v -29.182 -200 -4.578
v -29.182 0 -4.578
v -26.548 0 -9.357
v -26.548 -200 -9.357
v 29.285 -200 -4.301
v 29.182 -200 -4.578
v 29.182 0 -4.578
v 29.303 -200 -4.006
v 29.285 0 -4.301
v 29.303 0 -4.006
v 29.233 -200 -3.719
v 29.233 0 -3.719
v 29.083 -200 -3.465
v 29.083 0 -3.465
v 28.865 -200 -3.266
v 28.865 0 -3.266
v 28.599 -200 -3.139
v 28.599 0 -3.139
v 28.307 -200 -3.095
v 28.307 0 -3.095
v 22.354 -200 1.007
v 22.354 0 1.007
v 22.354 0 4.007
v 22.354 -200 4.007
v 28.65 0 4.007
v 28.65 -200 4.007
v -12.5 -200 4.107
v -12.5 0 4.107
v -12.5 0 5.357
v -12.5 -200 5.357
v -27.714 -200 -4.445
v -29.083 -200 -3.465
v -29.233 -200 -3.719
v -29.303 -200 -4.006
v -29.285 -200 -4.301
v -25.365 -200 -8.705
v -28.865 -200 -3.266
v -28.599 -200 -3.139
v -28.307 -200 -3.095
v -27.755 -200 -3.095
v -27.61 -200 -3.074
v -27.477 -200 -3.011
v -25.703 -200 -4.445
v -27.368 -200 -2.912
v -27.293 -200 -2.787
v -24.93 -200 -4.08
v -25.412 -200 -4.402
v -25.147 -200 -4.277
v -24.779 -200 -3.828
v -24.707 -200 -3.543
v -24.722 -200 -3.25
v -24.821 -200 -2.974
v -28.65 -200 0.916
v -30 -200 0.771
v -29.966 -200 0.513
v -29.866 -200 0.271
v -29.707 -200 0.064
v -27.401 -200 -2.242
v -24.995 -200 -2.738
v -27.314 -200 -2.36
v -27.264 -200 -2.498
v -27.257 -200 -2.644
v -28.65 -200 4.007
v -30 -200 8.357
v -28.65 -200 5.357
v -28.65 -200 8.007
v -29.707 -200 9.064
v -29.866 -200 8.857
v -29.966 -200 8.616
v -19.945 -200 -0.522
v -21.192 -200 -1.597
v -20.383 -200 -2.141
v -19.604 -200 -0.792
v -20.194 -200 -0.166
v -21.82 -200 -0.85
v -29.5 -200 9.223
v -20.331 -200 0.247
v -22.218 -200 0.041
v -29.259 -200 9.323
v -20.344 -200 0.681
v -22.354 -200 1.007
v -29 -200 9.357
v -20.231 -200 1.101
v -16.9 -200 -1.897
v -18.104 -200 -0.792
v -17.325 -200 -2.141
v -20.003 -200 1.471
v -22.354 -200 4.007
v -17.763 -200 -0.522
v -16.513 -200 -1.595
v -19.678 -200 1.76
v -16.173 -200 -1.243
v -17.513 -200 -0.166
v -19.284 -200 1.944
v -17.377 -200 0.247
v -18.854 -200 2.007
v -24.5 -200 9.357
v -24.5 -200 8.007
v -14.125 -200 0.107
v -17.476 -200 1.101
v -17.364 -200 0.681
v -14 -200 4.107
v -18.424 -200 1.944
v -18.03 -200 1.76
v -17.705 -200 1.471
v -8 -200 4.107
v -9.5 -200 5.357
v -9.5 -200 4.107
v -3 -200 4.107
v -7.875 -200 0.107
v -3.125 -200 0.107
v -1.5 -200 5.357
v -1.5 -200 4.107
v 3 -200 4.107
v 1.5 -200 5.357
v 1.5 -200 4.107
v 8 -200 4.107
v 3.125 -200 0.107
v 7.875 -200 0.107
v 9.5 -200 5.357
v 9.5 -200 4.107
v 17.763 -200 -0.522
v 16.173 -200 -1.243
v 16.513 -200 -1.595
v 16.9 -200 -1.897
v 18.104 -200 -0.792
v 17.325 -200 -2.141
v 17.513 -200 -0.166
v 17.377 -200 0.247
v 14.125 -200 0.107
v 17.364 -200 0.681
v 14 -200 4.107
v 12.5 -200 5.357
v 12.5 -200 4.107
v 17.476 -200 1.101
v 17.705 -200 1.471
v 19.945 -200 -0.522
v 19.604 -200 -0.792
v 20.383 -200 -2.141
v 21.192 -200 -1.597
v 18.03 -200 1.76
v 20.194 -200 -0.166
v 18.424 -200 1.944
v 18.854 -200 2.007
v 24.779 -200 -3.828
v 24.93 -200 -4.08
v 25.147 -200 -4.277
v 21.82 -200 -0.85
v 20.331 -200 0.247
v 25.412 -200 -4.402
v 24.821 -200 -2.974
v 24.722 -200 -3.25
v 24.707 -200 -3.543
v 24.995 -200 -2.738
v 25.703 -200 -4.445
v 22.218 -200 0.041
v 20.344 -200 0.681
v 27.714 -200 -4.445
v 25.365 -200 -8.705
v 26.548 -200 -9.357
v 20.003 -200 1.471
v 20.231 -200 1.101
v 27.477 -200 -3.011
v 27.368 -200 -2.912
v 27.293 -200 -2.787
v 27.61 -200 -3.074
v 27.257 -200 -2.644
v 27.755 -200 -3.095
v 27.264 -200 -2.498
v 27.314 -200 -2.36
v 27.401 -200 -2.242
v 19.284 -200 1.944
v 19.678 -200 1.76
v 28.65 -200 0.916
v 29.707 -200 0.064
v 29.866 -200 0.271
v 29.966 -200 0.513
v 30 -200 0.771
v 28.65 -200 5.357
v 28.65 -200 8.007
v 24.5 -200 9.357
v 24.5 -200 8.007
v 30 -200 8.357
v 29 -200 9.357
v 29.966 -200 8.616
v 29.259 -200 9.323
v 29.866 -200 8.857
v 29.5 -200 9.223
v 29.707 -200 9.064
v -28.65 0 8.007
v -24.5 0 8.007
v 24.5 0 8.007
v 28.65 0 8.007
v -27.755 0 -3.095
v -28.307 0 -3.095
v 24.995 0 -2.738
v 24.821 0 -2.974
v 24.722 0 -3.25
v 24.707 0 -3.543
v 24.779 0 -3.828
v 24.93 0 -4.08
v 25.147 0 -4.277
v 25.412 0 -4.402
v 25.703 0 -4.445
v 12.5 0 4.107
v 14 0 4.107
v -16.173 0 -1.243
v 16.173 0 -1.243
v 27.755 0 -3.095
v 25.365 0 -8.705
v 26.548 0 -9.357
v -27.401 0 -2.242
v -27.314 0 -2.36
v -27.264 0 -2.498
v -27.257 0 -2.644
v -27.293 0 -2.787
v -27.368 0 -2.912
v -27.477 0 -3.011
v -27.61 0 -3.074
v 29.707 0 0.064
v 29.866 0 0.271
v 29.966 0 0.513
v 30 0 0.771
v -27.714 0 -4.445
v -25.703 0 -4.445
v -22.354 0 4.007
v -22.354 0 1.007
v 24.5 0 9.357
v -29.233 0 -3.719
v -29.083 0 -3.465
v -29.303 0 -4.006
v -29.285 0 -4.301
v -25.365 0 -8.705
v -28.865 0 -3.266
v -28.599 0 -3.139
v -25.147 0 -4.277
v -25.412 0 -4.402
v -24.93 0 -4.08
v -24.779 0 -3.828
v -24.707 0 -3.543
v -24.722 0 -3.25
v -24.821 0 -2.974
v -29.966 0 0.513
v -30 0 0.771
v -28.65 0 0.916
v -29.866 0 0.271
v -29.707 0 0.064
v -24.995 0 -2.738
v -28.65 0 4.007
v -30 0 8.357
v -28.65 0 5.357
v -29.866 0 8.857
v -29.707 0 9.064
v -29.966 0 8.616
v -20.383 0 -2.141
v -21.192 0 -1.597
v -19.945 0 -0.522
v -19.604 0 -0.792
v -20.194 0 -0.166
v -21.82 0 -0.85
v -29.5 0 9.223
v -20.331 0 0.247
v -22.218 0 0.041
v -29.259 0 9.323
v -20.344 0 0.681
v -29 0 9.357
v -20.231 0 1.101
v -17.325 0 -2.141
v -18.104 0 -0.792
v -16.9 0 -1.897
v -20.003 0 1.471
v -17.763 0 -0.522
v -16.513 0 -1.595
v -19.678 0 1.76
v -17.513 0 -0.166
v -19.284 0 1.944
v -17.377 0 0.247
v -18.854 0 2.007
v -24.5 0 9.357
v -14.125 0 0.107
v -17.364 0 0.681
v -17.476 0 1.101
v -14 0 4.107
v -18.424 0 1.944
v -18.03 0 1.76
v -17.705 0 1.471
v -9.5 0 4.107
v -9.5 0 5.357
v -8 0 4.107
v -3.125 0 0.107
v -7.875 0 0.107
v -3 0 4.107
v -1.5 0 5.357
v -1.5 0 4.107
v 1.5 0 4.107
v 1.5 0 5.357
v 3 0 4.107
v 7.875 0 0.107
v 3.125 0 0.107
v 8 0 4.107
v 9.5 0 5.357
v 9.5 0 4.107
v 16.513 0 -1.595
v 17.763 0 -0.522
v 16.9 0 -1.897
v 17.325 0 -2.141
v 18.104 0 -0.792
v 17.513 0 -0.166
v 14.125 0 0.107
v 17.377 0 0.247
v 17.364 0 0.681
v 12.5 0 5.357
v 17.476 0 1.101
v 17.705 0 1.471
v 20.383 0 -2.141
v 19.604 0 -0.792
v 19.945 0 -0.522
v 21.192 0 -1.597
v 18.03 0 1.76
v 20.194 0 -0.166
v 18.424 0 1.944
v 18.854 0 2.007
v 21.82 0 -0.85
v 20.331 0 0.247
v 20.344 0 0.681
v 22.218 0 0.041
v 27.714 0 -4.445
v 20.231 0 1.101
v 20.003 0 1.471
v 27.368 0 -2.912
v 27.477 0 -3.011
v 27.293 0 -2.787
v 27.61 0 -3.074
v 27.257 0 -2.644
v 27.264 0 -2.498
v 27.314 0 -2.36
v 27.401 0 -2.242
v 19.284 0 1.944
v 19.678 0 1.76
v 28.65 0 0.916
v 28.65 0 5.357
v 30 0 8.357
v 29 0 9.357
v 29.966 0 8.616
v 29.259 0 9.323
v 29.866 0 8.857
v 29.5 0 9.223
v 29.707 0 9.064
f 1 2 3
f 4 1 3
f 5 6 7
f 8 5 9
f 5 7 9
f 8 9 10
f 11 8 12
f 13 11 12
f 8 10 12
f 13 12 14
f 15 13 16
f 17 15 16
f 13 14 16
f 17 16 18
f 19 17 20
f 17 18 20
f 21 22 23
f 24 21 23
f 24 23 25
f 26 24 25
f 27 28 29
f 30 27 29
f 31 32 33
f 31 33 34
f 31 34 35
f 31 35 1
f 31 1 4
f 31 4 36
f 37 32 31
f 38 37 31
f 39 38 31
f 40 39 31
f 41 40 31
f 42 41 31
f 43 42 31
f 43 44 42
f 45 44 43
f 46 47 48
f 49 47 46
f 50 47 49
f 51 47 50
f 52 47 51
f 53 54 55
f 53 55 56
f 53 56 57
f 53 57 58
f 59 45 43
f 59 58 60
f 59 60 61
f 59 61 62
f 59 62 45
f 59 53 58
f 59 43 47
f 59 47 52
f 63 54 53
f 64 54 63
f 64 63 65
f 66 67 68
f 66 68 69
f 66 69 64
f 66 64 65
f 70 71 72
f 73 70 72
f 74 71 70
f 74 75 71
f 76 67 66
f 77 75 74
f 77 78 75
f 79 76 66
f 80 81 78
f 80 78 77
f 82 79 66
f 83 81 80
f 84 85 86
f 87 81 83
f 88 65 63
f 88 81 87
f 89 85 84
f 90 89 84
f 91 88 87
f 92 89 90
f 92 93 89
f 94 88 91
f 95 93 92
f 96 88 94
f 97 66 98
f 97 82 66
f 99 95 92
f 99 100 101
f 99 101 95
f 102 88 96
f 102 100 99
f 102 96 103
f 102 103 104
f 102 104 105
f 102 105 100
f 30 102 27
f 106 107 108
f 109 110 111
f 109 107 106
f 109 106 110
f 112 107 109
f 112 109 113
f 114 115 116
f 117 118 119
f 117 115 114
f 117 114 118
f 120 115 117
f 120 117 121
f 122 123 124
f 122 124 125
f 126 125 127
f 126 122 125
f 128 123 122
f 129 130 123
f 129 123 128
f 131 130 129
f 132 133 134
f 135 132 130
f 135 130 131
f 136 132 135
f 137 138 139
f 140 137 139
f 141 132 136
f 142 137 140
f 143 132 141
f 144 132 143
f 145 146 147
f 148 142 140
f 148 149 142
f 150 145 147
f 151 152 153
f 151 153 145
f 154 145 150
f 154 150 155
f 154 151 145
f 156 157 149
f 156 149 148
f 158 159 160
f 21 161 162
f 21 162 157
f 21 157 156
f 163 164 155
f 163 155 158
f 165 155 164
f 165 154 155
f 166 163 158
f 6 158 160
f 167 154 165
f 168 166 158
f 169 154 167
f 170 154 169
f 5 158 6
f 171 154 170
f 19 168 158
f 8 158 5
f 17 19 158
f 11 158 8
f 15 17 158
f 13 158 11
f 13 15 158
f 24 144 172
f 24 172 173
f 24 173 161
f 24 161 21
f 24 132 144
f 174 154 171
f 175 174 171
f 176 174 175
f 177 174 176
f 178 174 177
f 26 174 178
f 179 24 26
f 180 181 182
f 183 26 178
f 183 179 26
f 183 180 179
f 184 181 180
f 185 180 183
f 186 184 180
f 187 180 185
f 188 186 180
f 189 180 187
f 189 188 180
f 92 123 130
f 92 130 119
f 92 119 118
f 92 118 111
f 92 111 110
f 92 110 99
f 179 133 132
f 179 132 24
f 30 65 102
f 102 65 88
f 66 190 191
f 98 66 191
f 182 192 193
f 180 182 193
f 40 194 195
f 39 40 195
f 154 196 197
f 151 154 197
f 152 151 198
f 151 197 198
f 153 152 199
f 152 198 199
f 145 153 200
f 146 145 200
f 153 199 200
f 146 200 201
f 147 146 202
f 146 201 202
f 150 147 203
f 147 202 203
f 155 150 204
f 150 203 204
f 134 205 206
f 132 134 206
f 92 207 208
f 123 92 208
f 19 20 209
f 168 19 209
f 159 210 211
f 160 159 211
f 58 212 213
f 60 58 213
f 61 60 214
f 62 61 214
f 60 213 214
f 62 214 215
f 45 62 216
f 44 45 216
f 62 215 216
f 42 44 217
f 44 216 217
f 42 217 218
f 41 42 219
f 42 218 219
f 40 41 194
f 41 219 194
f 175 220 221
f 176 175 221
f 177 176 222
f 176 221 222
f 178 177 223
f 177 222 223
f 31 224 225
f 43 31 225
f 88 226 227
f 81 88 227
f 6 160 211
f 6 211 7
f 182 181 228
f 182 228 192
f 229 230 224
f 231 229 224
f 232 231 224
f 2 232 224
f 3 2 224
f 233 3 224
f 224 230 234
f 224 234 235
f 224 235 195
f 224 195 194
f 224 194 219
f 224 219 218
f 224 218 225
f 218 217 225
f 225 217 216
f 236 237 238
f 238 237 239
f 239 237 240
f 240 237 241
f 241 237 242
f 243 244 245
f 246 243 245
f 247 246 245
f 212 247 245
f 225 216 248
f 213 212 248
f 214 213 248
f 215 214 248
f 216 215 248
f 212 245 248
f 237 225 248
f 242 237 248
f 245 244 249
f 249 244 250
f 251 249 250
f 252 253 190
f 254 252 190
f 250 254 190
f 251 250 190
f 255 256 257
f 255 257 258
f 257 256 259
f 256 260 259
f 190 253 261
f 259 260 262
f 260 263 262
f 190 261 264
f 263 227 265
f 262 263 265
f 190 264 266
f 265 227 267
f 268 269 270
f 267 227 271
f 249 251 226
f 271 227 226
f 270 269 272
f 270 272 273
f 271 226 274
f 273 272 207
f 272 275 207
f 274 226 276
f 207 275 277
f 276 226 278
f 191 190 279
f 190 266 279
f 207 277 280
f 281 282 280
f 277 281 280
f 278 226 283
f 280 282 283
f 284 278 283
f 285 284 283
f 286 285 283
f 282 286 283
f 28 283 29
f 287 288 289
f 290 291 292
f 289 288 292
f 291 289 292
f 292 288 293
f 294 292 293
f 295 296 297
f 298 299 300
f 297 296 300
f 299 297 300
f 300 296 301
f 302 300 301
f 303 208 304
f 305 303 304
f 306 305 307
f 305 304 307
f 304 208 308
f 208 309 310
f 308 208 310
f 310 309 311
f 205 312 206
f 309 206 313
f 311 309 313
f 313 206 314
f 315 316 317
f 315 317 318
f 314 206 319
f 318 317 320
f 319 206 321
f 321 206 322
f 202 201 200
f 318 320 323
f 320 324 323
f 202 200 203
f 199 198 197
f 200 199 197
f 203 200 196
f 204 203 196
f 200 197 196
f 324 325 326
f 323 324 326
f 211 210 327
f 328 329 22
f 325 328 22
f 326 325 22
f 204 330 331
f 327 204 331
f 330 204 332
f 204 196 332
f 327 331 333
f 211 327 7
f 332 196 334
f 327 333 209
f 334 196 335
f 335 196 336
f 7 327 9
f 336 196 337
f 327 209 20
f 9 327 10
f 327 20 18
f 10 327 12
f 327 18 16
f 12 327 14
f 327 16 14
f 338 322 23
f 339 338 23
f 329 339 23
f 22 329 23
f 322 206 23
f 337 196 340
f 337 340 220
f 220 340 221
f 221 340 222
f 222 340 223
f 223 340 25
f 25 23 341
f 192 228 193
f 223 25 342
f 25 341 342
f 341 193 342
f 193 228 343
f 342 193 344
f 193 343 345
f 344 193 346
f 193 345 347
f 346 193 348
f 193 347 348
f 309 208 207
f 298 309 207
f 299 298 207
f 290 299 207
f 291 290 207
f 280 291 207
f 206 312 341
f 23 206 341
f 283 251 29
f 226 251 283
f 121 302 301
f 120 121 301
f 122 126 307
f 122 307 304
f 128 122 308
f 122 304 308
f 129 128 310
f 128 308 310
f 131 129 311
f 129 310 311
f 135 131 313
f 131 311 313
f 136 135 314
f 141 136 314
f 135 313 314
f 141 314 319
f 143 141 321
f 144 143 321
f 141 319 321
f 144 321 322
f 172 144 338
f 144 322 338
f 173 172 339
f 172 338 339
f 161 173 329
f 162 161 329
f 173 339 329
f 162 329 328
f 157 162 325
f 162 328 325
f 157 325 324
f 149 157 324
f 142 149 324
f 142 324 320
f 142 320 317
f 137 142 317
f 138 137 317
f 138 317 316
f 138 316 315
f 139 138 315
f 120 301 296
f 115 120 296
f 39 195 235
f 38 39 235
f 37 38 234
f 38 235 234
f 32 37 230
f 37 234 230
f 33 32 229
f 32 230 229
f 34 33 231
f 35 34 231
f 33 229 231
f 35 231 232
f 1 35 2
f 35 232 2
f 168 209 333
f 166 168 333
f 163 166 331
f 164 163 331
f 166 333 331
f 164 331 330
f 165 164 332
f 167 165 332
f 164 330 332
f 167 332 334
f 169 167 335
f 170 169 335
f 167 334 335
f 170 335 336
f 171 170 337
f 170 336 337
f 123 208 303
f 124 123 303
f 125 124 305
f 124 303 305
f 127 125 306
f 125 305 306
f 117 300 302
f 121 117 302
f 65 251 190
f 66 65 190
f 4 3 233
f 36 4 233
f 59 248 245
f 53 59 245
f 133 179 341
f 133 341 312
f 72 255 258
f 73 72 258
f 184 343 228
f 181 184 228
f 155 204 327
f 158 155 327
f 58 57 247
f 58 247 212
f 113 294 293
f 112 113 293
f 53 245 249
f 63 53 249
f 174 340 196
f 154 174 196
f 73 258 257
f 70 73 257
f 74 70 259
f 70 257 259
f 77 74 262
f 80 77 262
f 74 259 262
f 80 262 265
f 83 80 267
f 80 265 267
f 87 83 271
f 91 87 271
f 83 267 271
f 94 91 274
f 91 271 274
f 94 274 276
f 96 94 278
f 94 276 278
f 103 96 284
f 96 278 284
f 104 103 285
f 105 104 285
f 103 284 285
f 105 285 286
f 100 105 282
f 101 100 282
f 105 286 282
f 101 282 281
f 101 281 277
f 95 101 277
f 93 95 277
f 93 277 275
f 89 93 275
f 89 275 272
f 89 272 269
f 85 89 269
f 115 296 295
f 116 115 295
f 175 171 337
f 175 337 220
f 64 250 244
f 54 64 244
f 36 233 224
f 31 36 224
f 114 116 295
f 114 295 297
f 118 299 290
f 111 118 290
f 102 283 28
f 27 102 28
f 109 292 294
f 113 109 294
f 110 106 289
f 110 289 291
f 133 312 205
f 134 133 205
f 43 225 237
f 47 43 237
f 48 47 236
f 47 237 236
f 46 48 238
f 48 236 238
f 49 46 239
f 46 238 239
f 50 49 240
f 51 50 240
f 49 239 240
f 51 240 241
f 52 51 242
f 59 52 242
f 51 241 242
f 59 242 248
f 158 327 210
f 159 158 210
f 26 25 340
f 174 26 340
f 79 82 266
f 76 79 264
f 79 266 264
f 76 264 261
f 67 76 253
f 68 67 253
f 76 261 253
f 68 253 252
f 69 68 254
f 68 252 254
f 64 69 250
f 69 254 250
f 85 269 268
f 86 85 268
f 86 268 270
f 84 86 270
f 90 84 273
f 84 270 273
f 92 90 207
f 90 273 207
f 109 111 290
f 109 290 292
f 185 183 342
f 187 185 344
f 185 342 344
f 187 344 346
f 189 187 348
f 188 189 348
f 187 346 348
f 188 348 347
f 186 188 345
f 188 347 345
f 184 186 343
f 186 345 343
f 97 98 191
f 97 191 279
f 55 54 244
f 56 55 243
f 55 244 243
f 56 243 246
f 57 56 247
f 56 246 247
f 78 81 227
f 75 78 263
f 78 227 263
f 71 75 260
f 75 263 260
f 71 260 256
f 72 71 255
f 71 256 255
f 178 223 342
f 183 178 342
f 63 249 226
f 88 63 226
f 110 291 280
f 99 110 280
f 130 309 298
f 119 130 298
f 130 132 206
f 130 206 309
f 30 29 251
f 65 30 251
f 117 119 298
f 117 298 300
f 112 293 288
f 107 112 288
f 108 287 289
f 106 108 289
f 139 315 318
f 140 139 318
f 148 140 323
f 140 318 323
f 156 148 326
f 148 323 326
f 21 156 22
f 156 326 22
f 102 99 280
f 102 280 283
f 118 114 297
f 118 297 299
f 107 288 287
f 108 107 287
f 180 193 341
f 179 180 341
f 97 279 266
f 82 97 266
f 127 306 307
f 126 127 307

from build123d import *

# Parameters (mm, degrees)
F1_DEPTH = 200


# Not quite as in the source:
# - ends of sketch curves that miss each other by under 0.0002 mm in the source are joined


with BuildPart() as f1:
    # F0 (on Front) → F1 (new body)
    with BuildSketch(Plane.XZ):
        with BuildLine():
            Line((-18.103784, -0.791851), (-17.32476, -2.14116))
            ThreePointArc((-17.32476, -2.14116), (-16.7014064944, -1.7527534112), (-16.1728328101, -1.2428131594))
            Line((-16.1728328101, -1.2428131594), (16.172833, -1.242813))
            ThreePointArc((16.172833, -1.242813), (16.7014064944, -1.7527534112), (17.3247602013, -2.1411595856))
            Line((17.3247602013, -2.1411595856), (18.103784, -0.791851))
            ThreePointArc((18.103784, -0.791851), (18.853784, 2.007187), (19.6037840458, -0.7918510793))
            Line((19.6037840458, -0.7918510793), (20.382808, -2.14116))
            ThreePointArc((20.382808, -2.14116), (21.820396824, -0.8500174455), (22.353784, 1.007187))
            Line((22.353784, 1.007187), (22.353784, 4.007187))
            Line((22.353784, 4.007187), (28.65, 4.007187))
            Line((28.65, 4.007187), (28.65, 0.916375))
            Line((28.65, 0.916375), (24.995488, -2.738136))
            ThreePointArc((24.995488, -2.738136), (24.7787154675, -3.8279264324), (25.702595, -4.445243))
            Line((25.702595, -4.445243), (27.714112, -4.445243))
            Line((27.714112, -4.445243), (25.365346, -8.705386))
            Line((25.365346, -8.705386), (26.54757, -9.357187))
            Line((26.54757, -9.357187), (29.182471, -4.578059))
            ThreePointArc((29.182471, -4.578059), (29.1678006221, -3.5867237514), (28.30675, -3.095243))
            Line((28.30675, -3.095243), (27.754677, -3.095243))
            ThreePointArc((27.754677, -3.095243), (27.292737369, -2.7865850428), (27.4011231094, -2.2416901094))
            Line((27.4011231094, -2.2416901094), (29.707107, 0.064294))
            ThreePointArc((29.707107, 0.064294), (29.9238795325, 0.3887175676), (30, 0.771401))
            Line((30, 0.771401), (30, 8.357187))
            ThreePointArc((30, 8.357187), (29.7071067812, 9.0642937812), (29, 9.357187))
            Line((29, 9.357187), (24.5, 9.357187))
            Line((24.5, 9.357187), (24.5, 8.007187))
            Line((24.5, 8.007187), (28.65, 8.007187))
            Line((28.65, 8.007187), (28.65, 5.357187))
            Line((28.65, 5.357187), (12.5, 5.357187))
            Line((12.5, 5.357187), (12.5, 4.107187))
            Line((12.5, 4.107187), (14, 4.107187))
            Line((14, 4.107187), (14.125, 0.107187))
            Line((14.125, 0.107187), (7.875, 0.107187))
            Line((7.875, 0.107187), (8, 4.107187))
            Line((8, 4.107187), (9.5, 4.107187))
            Line((9.5, 4.107187), (9.5, 5.357187))
            Line((9.5, 5.357187), (1.5, 5.357187))
            Line((1.5, 5.357187), (1.5, 4.107187))
            Line((1.5, 4.107187), (3, 4.107187))
            Line((3, 4.107187), (3.125, 0.107187))
            Line((3.125, 0.107187), (-3.125, 0.107187))
            Line((-3.125, 0.107187), (-3, 4.107187))
            Line((-3, 4.107187), (-1.5, 4.107187))
            Line((-1.5, 4.107187), (-1.5, 5.357187))
            Line((-1.5, 5.357187), (-9.5, 5.357187))
            Line((-9.5, 5.357187), (-9.5, 4.107187))
            Line((-9.5, 4.107187), (-8, 4.107187))
            Line((-8, 4.107187), (-7.875, 0.107187))
            Line((-7.875, 0.107187), (-14.125, 0.107187))
            Line((-14.125, 0.107187), (-14, 4.107187))
            Line((-14, 4.107187), (-12.5, 4.107187))
            Line((-12.5, 4.107187), (-12.5, 5.357187))
            Line((-12.5, 5.357187), (-28.65, 5.357187))
            Line((-28.65, 5.357187), (-28.65, 8.007187))
            Line((-28.65, 8.007187), (-24.5, 8.007187))
            Line((-24.5, 8.007187), (-24.5, 9.357187))
            Line((-24.5, 9.357187), (-29, 9.357187))
            ThreePointArc((-29, 9.357187), (-29.7071067812, 9.0642937812), (-30, 8.357187))
            Line((-30, 8.357187), (-30, 0.771401))
            ThreePointArc((-30, 0.771401), (-29.9238795325, 0.3887175676), (-29.7071067812, 0.0642942188))
            Line((-29.7071067812, 0.0642942188), (-27.401123, -2.24169))
            ThreePointArc((-27.401123, -2.24169), (-27.2927362337, -2.7865847162), (-27.754676, -3.095243))
            Line((-27.754676, -3.095243), (-28.306749, -3.095243))
            ThreePointArc((-28.306749, -3.095243), (-29.1677994994, -3.5867235436), (-29.1824708638, -4.5780589249))
            Line((-29.1824708638, -4.5780589249), (-26.54757, -9.357187))
            Line((-26.54757, -9.357187), (-25.365345, -8.705386))
            Line((-25.365345, -8.705386), (-27.714112, -4.445243))
            Line((-27.714112, -4.445243), (-25.702595, -4.445243))
            ThreePointArc((-25.702595, -4.445243), (-24.7787154675, -3.8279264324), (-24.9954882188, -2.7381362188))
            Line((-24.9954882188, -2.7381362188), (-28.65, 0.916375))
            Line((-28.65, 0.916375), (-28.65, 4.007187))
            Line((-28.65, 4.007187), (-22.353784, 4.007187))
            Line((-22.353784, 4.007187), (-22.353784, 1.007187))
            ThreePointArc((-22.353784, 1.007187), (-21.820396824, -0.8500174455), (-20.3828077987, -2.1411595856))
            Line((-20.3828077987, -2.1411595856), (-19.603784, -0.791851))
            ThreePointArc((-19.603784, -0.791851), (-18.853784, 2.007187), (-18.103784, -0.791851))
        make_face()
    extrude(amount=F1_DEPTH)


solid = f1.part
